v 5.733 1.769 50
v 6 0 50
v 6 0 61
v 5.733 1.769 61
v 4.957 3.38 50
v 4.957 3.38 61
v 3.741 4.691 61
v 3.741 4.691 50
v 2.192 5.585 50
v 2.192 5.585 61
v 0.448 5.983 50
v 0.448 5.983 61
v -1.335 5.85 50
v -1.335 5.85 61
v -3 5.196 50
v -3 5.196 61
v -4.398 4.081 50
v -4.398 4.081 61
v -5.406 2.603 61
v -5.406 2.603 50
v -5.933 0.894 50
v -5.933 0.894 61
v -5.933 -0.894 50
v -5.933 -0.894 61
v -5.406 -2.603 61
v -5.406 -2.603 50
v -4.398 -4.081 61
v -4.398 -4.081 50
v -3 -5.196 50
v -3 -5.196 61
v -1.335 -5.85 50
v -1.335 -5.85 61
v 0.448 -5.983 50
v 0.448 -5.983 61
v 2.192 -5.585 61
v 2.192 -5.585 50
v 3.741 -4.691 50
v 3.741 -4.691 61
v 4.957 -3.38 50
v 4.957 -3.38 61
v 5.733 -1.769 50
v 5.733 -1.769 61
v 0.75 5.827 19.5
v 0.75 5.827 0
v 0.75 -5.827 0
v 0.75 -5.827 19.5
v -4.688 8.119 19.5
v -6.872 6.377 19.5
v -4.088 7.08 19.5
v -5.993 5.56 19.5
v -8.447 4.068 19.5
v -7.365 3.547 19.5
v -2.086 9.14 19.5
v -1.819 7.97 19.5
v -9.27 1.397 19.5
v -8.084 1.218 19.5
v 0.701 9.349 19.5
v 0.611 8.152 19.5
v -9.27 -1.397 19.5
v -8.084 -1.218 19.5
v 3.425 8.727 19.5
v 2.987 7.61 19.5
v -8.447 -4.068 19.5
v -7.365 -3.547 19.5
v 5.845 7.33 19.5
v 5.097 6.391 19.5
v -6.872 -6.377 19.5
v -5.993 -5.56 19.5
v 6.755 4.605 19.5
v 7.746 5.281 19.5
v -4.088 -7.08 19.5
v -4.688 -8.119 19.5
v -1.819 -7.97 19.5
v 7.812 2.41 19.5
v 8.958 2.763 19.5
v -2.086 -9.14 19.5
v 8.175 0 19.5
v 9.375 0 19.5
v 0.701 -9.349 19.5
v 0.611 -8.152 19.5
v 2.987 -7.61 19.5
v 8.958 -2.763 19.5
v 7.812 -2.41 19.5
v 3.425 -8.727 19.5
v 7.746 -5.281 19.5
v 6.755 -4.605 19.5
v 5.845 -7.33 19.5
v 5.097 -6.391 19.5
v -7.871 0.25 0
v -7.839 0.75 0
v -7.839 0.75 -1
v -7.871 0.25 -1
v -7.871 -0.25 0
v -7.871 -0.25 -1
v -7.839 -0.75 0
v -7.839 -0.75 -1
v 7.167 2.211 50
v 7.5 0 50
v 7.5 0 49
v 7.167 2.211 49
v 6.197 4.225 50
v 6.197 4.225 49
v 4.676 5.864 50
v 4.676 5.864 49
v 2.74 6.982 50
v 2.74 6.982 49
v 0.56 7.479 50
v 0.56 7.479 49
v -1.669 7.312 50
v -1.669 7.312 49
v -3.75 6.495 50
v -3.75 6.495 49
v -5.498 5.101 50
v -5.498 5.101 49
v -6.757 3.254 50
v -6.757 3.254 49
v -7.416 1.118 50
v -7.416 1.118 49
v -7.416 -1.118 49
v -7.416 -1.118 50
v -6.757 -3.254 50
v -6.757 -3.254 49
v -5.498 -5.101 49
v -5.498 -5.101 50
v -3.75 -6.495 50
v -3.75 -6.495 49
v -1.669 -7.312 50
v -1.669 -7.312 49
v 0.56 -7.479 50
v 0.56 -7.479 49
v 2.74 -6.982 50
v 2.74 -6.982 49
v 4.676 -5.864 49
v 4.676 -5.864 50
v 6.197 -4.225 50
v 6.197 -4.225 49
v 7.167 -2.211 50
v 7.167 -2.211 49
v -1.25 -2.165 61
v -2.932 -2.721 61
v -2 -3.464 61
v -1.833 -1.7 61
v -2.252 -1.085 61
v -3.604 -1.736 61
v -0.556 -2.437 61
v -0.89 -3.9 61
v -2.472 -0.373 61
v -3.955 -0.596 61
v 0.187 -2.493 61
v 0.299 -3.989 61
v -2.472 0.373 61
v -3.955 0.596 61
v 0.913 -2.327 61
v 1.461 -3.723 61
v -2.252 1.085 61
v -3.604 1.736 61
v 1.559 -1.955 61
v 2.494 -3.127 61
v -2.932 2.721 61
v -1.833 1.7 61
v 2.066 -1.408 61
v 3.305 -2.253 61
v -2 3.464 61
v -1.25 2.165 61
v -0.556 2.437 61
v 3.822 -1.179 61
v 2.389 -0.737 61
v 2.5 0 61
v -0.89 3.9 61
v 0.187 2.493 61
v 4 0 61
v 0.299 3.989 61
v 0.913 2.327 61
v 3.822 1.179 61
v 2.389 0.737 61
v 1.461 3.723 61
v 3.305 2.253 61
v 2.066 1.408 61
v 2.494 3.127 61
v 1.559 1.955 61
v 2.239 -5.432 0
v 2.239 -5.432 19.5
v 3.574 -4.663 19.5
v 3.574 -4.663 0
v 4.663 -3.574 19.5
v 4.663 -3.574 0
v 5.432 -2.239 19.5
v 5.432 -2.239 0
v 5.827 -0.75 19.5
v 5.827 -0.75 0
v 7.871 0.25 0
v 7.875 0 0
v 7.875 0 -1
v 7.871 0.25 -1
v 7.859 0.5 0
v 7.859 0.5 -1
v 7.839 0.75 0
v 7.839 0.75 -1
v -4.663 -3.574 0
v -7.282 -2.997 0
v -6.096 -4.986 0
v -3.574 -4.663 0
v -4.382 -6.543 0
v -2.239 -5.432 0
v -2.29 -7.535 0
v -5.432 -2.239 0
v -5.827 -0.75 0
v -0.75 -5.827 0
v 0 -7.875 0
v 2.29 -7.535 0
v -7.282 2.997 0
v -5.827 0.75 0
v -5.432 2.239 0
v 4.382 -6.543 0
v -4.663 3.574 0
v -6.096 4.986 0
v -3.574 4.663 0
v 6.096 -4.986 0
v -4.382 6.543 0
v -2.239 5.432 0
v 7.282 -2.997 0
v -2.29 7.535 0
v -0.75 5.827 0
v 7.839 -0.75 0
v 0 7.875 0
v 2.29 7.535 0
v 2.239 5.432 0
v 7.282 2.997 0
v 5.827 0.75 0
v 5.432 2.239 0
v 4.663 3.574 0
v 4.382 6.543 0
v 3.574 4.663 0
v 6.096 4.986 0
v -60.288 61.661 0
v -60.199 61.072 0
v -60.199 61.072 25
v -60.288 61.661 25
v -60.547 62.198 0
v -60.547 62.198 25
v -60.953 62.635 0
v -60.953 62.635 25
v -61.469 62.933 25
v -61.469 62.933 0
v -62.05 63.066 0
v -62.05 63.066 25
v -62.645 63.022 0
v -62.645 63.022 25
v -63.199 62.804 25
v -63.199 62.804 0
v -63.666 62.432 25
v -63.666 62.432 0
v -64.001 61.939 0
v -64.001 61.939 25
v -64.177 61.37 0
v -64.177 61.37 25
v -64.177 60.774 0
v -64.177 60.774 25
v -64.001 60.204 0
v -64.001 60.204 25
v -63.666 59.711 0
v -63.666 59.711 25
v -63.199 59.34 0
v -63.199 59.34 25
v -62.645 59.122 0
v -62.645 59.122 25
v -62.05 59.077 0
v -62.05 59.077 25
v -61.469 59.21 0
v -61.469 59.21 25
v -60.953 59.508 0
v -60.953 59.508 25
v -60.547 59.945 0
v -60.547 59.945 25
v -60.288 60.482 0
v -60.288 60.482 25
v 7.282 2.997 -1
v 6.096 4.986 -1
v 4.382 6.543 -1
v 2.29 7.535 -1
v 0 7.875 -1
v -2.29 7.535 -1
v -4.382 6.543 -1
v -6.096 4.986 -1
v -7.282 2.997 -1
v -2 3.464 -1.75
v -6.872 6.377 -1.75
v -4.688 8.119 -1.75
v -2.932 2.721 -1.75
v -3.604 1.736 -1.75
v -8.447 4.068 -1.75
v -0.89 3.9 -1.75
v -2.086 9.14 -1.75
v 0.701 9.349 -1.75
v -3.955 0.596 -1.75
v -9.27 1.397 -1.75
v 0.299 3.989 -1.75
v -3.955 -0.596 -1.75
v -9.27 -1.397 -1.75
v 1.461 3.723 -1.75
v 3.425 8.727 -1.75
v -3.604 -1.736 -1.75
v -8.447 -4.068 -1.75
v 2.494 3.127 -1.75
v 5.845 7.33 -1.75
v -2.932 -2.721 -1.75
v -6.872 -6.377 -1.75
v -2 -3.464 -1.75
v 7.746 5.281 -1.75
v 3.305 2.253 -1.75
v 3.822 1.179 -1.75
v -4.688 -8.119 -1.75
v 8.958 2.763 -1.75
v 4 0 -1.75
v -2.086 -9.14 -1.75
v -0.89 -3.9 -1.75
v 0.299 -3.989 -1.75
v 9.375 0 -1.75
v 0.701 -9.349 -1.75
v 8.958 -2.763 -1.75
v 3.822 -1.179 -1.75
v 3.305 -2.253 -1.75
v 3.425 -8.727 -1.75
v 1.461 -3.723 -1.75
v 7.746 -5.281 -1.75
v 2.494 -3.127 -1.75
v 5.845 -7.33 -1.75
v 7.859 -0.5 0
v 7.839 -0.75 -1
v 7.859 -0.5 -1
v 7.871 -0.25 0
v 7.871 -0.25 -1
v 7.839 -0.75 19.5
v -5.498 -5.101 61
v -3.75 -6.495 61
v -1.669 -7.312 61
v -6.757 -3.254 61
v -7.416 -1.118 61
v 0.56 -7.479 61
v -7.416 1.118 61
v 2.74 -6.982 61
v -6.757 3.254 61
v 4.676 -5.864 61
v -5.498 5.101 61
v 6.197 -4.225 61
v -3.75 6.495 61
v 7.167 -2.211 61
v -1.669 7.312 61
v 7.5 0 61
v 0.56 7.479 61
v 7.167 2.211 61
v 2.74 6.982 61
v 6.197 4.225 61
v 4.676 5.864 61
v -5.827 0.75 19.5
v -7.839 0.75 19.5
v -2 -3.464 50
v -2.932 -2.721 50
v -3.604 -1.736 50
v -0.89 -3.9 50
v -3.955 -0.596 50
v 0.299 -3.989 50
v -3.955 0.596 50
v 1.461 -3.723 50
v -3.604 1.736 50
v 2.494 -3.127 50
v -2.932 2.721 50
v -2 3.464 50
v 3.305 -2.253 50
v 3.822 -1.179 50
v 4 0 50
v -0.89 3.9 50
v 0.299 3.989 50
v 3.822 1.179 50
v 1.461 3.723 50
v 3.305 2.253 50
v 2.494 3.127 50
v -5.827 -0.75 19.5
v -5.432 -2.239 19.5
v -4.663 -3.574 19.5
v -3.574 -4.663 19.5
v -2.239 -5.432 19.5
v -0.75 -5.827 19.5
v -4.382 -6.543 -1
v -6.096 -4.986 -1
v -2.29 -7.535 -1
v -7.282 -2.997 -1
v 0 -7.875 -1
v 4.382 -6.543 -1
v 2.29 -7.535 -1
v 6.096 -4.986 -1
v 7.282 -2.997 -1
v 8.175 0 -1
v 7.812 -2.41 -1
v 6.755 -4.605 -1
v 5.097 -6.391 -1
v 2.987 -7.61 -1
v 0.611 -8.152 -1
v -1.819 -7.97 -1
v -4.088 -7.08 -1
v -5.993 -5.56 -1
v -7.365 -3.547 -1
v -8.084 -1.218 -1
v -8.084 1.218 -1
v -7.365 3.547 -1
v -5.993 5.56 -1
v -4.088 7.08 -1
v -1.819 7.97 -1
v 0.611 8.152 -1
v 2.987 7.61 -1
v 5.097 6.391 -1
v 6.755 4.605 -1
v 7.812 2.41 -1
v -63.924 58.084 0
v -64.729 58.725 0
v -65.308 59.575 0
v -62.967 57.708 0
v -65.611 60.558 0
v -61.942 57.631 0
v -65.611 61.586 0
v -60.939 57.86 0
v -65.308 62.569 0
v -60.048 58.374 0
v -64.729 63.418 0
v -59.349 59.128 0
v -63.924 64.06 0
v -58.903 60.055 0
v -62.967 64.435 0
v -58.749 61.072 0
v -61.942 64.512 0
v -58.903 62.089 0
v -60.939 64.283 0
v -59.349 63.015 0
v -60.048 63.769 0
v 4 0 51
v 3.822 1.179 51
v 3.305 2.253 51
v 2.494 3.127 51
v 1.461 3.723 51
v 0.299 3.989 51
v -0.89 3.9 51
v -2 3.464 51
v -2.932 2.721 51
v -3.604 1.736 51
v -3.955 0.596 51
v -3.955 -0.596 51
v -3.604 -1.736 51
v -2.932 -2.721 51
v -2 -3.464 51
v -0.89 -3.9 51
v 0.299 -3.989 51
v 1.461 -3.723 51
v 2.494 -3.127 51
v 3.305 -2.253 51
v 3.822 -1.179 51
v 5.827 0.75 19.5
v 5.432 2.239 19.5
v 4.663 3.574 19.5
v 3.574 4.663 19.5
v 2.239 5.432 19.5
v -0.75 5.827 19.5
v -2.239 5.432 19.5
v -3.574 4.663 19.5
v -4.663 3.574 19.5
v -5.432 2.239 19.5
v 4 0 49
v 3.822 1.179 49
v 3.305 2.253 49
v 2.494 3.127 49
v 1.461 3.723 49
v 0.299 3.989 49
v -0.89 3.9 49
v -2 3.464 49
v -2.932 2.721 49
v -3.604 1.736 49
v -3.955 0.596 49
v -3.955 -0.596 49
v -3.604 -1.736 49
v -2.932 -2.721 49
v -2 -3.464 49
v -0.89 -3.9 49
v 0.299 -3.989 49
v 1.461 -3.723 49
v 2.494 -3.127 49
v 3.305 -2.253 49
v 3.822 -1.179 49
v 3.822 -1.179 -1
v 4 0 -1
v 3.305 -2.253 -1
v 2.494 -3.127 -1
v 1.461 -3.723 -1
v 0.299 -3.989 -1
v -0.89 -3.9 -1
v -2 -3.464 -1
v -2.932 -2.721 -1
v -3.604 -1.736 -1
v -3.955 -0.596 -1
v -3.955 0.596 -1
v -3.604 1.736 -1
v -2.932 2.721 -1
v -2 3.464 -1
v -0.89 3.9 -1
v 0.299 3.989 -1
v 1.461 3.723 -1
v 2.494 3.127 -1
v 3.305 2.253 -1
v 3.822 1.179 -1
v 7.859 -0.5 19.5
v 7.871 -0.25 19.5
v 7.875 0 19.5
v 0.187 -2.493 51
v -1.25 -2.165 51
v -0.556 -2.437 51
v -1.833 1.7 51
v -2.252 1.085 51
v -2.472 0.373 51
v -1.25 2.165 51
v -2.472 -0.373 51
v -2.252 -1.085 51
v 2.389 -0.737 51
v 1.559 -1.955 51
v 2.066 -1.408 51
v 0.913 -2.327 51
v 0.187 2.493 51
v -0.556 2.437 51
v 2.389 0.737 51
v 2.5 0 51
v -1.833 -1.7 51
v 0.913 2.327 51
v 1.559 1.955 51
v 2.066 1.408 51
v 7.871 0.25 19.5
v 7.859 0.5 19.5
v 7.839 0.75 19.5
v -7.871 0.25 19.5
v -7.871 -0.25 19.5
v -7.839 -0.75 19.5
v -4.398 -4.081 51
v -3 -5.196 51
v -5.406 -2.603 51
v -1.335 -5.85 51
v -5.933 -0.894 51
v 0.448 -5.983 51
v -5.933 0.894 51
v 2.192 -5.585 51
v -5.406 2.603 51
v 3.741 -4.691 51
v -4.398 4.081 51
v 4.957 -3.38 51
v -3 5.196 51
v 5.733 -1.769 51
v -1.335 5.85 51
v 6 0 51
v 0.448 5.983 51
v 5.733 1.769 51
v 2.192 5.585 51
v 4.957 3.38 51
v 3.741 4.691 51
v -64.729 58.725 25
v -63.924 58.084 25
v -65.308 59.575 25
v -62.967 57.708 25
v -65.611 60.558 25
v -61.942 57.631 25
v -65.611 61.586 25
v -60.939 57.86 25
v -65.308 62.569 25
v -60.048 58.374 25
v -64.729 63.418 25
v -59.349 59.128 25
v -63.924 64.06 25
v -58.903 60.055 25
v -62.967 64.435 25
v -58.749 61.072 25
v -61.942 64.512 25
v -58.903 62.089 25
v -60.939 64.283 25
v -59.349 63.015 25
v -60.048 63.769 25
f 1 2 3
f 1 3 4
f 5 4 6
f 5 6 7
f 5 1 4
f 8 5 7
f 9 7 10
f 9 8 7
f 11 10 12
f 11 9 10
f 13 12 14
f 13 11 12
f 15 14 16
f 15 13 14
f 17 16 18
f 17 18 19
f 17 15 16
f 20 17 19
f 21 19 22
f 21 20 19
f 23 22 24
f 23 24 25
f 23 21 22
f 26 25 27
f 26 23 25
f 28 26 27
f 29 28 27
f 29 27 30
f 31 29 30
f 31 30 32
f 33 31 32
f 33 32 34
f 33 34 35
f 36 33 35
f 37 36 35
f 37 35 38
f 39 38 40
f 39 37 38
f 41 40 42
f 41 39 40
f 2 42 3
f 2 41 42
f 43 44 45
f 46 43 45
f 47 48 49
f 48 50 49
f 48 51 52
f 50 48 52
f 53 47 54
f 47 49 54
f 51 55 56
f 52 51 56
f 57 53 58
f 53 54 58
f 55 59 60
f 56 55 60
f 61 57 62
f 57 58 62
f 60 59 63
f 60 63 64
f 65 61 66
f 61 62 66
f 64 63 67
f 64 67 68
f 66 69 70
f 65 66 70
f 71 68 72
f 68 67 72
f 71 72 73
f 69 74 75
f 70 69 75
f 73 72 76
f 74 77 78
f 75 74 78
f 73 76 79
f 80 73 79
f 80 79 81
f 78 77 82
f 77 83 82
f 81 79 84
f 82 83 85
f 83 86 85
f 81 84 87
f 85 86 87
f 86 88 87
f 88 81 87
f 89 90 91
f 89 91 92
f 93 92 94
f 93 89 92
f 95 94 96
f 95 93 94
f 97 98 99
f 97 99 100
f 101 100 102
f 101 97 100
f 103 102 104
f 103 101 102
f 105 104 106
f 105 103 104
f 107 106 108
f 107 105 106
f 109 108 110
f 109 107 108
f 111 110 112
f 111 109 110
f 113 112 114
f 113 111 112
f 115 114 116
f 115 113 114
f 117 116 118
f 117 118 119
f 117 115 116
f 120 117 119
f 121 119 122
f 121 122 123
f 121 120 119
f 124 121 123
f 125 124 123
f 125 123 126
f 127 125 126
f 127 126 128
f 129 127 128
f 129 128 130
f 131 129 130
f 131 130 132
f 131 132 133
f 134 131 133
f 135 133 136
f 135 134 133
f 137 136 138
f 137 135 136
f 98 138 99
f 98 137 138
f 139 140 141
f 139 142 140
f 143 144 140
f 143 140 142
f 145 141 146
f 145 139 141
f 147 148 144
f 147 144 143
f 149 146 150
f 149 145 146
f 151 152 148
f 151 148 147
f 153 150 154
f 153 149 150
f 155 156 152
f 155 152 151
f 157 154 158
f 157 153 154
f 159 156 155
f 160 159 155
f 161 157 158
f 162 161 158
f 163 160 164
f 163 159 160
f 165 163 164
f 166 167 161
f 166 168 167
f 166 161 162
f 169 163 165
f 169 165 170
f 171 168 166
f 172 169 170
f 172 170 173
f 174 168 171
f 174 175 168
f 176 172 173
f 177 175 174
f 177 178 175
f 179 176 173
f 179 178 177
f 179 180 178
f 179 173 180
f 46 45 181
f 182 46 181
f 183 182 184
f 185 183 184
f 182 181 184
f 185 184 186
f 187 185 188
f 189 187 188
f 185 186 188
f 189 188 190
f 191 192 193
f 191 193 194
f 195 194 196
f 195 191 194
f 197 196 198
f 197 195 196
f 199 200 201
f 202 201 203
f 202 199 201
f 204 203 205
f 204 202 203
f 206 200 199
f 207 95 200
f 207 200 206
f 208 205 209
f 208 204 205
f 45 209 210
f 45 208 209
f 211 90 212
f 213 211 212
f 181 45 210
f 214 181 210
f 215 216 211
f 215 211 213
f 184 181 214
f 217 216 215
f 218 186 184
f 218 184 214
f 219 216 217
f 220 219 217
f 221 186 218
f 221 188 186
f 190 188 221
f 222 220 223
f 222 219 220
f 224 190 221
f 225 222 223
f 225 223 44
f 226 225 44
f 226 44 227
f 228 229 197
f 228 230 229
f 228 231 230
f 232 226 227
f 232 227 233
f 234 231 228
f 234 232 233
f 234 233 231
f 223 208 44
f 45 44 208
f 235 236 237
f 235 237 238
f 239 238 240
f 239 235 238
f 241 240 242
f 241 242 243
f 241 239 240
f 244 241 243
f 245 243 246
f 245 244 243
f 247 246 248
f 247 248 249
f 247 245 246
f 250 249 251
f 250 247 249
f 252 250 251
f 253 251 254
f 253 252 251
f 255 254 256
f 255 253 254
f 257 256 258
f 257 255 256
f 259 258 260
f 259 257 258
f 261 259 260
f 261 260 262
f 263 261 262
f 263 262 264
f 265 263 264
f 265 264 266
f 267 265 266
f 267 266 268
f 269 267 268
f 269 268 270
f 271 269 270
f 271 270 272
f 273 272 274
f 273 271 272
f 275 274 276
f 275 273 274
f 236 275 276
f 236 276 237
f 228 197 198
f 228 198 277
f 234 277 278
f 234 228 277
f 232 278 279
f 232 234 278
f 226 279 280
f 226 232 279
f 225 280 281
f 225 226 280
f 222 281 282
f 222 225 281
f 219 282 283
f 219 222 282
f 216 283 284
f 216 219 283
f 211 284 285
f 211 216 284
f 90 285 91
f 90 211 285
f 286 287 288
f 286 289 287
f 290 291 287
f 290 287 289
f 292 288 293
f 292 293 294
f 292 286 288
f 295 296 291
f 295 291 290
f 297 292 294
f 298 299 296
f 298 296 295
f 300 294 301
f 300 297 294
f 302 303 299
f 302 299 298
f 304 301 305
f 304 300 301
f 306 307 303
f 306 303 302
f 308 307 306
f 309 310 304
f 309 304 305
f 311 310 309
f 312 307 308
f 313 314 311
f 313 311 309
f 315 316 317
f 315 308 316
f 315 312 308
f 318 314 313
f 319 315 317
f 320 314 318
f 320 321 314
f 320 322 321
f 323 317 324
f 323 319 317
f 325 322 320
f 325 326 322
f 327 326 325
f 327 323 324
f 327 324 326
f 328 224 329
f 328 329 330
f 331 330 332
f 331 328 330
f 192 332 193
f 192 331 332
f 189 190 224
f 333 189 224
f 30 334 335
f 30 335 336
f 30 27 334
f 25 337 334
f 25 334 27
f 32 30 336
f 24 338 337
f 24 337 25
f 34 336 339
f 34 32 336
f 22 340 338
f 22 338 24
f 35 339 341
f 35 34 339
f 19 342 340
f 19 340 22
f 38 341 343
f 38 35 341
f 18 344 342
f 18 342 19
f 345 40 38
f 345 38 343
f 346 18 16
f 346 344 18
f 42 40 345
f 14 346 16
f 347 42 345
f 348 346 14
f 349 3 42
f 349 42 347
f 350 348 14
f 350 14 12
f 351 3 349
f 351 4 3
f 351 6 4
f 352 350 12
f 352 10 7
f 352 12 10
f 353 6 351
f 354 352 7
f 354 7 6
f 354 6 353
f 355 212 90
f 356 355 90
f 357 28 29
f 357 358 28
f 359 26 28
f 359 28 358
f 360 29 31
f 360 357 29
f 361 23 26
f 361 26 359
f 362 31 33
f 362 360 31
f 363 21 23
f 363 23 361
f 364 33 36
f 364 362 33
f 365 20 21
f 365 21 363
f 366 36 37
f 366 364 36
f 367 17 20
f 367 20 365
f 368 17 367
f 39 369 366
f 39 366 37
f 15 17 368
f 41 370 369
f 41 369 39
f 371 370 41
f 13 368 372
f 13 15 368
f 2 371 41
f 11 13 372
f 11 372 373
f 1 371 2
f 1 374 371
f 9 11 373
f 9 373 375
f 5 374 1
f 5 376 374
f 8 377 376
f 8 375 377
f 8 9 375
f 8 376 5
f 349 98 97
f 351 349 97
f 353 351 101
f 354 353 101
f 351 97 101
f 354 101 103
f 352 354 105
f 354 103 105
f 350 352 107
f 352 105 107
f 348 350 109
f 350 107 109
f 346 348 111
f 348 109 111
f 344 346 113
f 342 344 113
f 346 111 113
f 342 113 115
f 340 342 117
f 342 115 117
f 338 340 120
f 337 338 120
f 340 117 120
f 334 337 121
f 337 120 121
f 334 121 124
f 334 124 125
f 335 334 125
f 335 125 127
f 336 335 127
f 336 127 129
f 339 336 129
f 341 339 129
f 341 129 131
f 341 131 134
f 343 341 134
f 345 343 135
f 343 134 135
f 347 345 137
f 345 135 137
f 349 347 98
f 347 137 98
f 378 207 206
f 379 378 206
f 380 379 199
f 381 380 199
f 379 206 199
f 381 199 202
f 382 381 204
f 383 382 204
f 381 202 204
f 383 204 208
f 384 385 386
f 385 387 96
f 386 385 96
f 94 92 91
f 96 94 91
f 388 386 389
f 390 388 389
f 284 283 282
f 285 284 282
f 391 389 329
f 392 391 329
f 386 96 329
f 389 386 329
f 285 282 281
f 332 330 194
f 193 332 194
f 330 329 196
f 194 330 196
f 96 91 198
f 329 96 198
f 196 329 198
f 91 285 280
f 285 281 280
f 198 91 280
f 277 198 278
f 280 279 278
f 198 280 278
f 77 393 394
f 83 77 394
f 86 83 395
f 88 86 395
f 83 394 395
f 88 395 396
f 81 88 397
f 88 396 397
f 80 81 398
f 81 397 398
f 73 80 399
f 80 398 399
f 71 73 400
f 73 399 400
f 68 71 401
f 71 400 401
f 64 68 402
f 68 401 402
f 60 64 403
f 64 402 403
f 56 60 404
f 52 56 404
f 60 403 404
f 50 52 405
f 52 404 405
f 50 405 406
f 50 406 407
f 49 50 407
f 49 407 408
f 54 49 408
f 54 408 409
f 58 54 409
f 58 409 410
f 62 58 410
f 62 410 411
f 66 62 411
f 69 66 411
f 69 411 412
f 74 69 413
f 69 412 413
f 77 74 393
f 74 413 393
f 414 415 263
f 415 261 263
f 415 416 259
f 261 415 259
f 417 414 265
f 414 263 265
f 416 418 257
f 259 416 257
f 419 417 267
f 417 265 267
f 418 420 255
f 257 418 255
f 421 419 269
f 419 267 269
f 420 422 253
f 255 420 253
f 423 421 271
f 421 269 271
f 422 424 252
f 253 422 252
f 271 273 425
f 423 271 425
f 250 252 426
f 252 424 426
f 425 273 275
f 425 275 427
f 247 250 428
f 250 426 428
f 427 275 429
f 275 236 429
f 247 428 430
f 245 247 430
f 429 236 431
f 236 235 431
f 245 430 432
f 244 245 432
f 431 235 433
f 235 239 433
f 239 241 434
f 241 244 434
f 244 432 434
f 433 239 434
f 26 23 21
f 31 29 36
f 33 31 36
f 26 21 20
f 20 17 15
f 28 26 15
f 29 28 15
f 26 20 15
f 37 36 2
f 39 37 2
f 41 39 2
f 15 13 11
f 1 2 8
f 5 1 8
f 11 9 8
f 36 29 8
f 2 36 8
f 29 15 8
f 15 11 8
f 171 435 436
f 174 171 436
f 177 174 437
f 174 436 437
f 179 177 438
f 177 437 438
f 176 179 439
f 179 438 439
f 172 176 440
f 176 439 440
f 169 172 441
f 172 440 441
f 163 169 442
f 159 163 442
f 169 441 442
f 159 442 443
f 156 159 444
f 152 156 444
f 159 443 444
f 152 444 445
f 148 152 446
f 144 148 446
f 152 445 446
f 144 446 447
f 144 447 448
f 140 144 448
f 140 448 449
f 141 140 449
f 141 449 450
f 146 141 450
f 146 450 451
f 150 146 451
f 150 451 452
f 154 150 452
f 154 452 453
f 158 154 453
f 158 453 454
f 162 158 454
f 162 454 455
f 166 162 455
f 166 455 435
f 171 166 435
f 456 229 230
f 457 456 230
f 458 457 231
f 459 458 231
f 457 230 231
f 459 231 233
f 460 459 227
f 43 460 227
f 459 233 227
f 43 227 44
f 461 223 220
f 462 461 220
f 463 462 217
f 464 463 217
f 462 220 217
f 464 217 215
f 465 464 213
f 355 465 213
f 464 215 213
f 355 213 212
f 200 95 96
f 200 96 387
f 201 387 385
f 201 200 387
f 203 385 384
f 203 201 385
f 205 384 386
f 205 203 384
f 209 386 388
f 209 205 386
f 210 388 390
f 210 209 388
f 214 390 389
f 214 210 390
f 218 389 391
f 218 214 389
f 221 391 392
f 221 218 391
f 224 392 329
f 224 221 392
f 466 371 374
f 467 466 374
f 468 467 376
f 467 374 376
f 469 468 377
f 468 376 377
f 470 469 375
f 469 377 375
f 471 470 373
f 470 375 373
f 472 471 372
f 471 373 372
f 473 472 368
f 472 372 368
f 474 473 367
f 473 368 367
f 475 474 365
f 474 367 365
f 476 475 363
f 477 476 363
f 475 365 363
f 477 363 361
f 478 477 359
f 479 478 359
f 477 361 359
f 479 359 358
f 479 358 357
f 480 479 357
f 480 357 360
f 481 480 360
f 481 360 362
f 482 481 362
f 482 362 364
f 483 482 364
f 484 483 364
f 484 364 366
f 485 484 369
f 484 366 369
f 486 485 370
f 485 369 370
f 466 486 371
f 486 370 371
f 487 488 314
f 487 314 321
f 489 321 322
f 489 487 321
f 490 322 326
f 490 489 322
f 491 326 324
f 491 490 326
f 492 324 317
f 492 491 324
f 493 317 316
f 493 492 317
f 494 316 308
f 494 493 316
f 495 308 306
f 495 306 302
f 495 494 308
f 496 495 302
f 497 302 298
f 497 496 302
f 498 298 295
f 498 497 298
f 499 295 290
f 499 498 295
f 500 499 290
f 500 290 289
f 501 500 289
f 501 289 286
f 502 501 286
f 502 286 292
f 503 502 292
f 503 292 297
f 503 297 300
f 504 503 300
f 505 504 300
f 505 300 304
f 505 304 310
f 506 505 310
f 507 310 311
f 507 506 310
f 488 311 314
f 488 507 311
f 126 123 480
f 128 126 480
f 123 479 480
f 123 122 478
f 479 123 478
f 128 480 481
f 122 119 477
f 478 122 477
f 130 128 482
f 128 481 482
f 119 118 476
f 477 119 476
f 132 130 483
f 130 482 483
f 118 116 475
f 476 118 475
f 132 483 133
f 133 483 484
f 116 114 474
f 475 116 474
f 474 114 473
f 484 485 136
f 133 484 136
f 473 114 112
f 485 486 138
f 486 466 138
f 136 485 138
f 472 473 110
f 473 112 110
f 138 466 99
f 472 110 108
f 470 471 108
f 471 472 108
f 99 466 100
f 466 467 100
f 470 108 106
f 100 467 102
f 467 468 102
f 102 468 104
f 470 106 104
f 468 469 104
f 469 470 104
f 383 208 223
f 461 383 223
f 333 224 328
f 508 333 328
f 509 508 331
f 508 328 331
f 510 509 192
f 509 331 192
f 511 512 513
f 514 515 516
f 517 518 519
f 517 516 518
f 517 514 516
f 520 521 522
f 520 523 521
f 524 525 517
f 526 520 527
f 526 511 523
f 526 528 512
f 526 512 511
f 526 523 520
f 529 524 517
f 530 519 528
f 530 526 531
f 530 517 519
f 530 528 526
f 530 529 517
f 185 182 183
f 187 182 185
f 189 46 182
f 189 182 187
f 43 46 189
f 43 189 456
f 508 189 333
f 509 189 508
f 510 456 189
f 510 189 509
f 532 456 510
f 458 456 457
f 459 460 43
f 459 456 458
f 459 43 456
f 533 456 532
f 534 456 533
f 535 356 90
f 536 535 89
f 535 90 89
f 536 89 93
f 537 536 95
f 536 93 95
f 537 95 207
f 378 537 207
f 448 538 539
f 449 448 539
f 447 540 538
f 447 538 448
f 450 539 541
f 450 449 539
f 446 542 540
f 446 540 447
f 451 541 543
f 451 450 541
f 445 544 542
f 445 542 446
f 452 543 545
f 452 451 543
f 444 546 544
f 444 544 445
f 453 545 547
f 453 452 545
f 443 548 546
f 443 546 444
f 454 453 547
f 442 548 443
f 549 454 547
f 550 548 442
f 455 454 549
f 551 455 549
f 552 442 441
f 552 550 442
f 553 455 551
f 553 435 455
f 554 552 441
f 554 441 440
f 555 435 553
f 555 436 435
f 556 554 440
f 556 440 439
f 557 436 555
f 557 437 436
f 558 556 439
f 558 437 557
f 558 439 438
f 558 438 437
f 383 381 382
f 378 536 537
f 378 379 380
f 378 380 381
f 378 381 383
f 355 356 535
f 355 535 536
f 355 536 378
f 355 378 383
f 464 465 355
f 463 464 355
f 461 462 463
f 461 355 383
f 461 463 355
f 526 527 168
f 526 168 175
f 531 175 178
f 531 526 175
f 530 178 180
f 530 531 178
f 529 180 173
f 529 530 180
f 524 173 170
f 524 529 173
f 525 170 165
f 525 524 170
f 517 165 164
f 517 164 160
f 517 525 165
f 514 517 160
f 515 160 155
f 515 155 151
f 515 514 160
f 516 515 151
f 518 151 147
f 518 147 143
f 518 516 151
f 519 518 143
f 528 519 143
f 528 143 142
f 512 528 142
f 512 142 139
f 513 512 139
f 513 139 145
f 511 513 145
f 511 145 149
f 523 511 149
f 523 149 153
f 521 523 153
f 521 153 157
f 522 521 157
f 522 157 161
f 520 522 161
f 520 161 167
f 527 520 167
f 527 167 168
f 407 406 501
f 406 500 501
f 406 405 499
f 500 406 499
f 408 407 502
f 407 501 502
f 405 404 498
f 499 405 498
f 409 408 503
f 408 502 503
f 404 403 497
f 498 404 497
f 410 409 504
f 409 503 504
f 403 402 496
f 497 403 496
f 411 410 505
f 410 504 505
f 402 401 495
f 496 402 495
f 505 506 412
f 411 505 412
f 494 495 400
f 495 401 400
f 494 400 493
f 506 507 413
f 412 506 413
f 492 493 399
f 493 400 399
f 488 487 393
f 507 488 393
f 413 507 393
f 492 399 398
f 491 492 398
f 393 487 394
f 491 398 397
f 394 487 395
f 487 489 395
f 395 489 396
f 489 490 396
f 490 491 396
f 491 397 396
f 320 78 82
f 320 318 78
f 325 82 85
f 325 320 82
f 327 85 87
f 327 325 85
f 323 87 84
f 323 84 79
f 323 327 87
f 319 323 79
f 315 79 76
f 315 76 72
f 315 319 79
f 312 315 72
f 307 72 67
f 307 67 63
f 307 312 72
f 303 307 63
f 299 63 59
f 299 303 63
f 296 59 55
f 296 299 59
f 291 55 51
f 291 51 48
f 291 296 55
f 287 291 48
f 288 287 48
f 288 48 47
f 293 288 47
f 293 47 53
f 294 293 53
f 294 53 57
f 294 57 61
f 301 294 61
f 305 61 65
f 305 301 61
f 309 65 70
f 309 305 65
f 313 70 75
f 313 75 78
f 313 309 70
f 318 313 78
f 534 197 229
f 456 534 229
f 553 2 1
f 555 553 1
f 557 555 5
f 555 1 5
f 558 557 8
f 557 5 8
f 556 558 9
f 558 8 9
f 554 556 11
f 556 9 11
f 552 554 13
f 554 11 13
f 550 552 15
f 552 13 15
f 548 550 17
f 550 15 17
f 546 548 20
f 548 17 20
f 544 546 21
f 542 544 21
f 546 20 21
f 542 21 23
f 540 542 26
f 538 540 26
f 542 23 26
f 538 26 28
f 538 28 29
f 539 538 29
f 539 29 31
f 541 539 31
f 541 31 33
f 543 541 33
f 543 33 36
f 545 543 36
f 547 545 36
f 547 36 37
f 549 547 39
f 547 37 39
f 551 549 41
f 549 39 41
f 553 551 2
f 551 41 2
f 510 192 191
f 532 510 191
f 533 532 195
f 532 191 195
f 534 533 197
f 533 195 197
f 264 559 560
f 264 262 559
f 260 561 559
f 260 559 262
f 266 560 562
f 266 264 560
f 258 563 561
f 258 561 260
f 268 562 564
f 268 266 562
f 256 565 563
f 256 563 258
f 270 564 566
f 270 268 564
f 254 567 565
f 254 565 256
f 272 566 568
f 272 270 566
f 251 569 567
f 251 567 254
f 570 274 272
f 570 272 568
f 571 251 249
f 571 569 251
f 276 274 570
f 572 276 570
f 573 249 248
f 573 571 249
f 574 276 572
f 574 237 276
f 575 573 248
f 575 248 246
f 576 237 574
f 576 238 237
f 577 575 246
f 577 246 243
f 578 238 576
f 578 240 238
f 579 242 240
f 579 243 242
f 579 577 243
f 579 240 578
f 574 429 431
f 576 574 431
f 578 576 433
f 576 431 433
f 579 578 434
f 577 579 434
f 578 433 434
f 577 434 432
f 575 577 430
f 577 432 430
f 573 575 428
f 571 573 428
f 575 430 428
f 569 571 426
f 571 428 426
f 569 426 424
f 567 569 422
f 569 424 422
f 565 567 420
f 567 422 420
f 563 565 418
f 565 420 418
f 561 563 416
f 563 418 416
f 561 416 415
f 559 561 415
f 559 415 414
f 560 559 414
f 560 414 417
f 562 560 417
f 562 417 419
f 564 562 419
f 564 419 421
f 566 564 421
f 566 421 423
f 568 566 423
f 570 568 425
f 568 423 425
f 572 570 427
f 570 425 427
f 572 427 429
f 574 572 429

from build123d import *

# Parameters (mm, degrees)
F2_DEPTH  = 19.5
F3_DEPTH  = 1
F4_R      = 9.375
F4_R_2    = 8.175
F4_R_3    = 7.875
F4_R_4    = 4
F5_DEPTH  = 0.75
F6_DEPTH  = 20.5
F8_R      = 7.5
F8_R_2    = 6
F8_R_3    = 4
F9_DEPTH  = 1
F10_DEPTH = 11
F12_DEPTH = 1
F11_R     = 4
F11_R_2   = 2.5
F13_DEPTH = 11
F14_R     = 3.45
F14_R_2   = 2
F15_DEPTH = 25


with BuildPart() as f2:
    # F1 (on Top) → F2 (new body)
    with BuildSketch(Plane.XY):
        with BuildLine():
            Line((-5.8269310104, 0.75), (-7.8392043601, 0.75))
            ThreePointArc((-7.8392043601, 0.75), (-7.875, 0), (-7.8392043601, -0.75))
            Line((-7.8392043601, -0.75), (-5.8269310104, -0.75))
            ThreePointArc((-5.8269310104, -0.75), (-4.1542523395, -4.1542523395), (-0.75, -5.8269310104))
            Line((-0.75, -5.8269310104), (-0.75, 5.8269310104))
            ThreePointArc((-0.75, 5.8269310104), (-4.1542523395, 4.1542523395), (-5.8269310104, 0.75))
        make_face()
    extrude(amount=F2_DEPTH)



with BuildPart() as f2b:
    # F1 (on Top) → F2, piece 2 (new body)
    with BuildSketch(Plane.XY):
        with BuildLine():
            ThreePointArc((7.8392043601, -0.75), (7.8660459996, -0.3754268663), (7.875, 0))
            ThreePointArc((7.875, 0), (7.8660459996, 0.3754268663), (7.8392043601, 0.75))
            Line((7.8392043601, 0.75), (5.8269310104, 0.75))
            ThreePointArc((5.8269310104, 0.75), (4.1542523395, 4.1542523395), (0.75, 5.8269310104))
            Line((0.75, 5.8269310104), (0.75, -5.8269310104))
            ThreePointArc((0.75, -5.8269310104), (4.1542523395, -4.1542523395), (5.8269310104, -0.75))
            Line((5.8269310104, -0.75), (7.8392043601, -0.75))
        make_face()
    extrude(amount=F2_DEPTH)


with BuildPart() as f2_1:
    add(f2.part)

    add(f2b.part)  # F3 merges F2b
    # F1 (on Top) → F3 (join)
    with BuildSketch(Plane.XY):
        with BuildLine():
            Line((5.8269310104, 0.75), (7.8392043601, 0.75))
            ThreePointArc((7.8392043601, 0.75), (0, 7.875), (-7.8392043601, 0.75))
            Line((-7.8392043601, 0.75), (-5.8269310104, 0.75))
            ThreePointArc((-5.8269310104, 0.75), (-4.1542523395, 4.1542523395), (-0.75, 5.8269310104))
            Line((-0.75, 5.8269310104), (-0.75, -5.8269310104))
            ThreePointArc((-0.75, -5.8269310104), (-4.1542523395, -4.1542523395), (-5.8269310104, -0.75))
            Line((-5.8269310104, -0.75), (-7.8392043601, -0.75))
            ThreePointArc((-7.8392043601, -0.75), (0, -7.875), (7.8392043601, -0.75))
            Line((7.8392043601, -0.75), (5.8269310104, -0.75))
            ThreePointArc((5.8269310104, -0.75), (4.1542523395, -4.1542523395), (0.75, -5.8269310104))
            Line((0.75, -5.8269310104), (0.75, 5.8269310104))
            ThreePointArc((0.75, 5.8269310104), (4.1542523395, 4.1542523395), (5.8269310104, 0.75))
        make_face()
        with BuildLine():
            Line((-5.8269310104, 0.75), (-7.8392043601, 0.75))
            ThreePointArc((-7.8392043601, 0.75), (-7.875, 0), (-7.8392043601, -0.75))
            Line((-7.8392043601, -0.75), (-5.8269310104, -0.75))
            ThreePointArc((-5.8269310104, -0.75), (-4.1542523395, -4.1542523395), (-0.75, -5.8269310104))
            Line((-0.75, -5.8269310104), (-0.75, 5.8269310104))
            ThreePointArc((-0.75, 5.8269310104), (-4.1542523395, 4.1542523395), (-5.8269310104, 0.75))
        make_face()
        with BuildLine():
            ThreePointArc((7.8392043601, -0.75), (7.8660459996, -0.3754268663), (7.875, 0))
            ThreePointArc((7.875, 0), (7.8660459996, 0.3754268663), (7.8392043601, 0.75))
            Line((7.8392043601, 0.75), (5.8269310104, 0.75))
            ThreePointArc((5.8269310104, 0.75), (4.1542523395, 4.1542523395), (0.75, 5.8269310104))
            Line((0.75, 5.8269310104), (0.75, -5.8269310104))
            ThreePointArc((0.75, -5.8269310104), (4.1542523395, -4.1542523395), (5.8269310104, -0.75))
            Line((5.8269310104, -0.75), (7.8392043601, -0.75))
        make_face()
    extrude(amount=-F3_DEPTH)


with BuildPart() as f5:
    # F4 (on face) → F5 (new body)
    with BuildSketch(Plane(origin=(0, 0, -1), x_dir=(1, 0, 0), z_dir=(0, 0, -1))):
        Circle(F4_R)
        Circle(F4_R_2, mode=Mode.SUBTRACT)
        Circle(F4_R_2)
        Circle(F4_R_3, mode=Mode.SUBTRACT)
        Circle(F4_R_3)
        Circle(F4_R_4, mode=Mode.SUBTRACT)
    extrude(amount=F5_DEPTH)

    # F4 (on face) → F6 (join)
    with BuildSketch(Plane(origin=(0, 0, -1), x_dir=(1, 0, 0), z_dir=(0, 0, -1))):
        Circle(F4_R)
        Circle(F4_R_2, mode=Mode.SUBTRACT)
    extrude(amount=-F6_DEPTH)


with BuildPart() as f9:
    # F8 (on offset) → F9 (new body)
    with BuildSketch(Plane.XY.offset(50)):
        Circle(F8_R)
        Circle(F8_R_2, mode=Mode.SUBTRACT)
        Circle(F8_R_2)
        Circle(F8_R_3, mode=Mode.SUBTRACT)
    extrude(amount=-F9_DEPTH)

    # F8 (on offset) → F10 (join)
    with BuildSketch(Plane.XY.offset(50)):
        Circle(F8_R)
        Circle(F8_R_2, mode=Mode.SUBTRACT)
    extrude(amount=F10_DEPTH)


with BuildPart() as f12:
    # F8 (on offset) → F12 (new body)
    with BuildSketch(Plane.XY.offset(50)):
        Circle(F8_R_2)
        Circle(F8_R_3, mode=Mode.SUBTRACT)
        Circle(F8_R_3)
    extrude(amount=F12_DEPTH)

    # F11 (on offset) → F13 (join)
    with BuildSketch(Plane.XY.offset(50)):
        Circle(F11_R)
        Circle(F11_R_2, mode=Mode.SUBTRACT)
    extrude(amount=F13_DEPTH)


with BuildPart() as f15:
    # F14 (on Top) → F15 (new body)
    with BuildSketch(Plane.XY):
        with Locations((-62.1994845569, 61.0717199743)):
            Circle(F14_R)
        with Locations((-62.1994845569, 61.0717199743)):
            Circle(F14_R_2, mode=Mode.SUBTRACT)
    extrude(amount=F15_DEPTH)


solid = Compound([f2_1.part, f5.part, f9.part, f12.part, f15.part])
